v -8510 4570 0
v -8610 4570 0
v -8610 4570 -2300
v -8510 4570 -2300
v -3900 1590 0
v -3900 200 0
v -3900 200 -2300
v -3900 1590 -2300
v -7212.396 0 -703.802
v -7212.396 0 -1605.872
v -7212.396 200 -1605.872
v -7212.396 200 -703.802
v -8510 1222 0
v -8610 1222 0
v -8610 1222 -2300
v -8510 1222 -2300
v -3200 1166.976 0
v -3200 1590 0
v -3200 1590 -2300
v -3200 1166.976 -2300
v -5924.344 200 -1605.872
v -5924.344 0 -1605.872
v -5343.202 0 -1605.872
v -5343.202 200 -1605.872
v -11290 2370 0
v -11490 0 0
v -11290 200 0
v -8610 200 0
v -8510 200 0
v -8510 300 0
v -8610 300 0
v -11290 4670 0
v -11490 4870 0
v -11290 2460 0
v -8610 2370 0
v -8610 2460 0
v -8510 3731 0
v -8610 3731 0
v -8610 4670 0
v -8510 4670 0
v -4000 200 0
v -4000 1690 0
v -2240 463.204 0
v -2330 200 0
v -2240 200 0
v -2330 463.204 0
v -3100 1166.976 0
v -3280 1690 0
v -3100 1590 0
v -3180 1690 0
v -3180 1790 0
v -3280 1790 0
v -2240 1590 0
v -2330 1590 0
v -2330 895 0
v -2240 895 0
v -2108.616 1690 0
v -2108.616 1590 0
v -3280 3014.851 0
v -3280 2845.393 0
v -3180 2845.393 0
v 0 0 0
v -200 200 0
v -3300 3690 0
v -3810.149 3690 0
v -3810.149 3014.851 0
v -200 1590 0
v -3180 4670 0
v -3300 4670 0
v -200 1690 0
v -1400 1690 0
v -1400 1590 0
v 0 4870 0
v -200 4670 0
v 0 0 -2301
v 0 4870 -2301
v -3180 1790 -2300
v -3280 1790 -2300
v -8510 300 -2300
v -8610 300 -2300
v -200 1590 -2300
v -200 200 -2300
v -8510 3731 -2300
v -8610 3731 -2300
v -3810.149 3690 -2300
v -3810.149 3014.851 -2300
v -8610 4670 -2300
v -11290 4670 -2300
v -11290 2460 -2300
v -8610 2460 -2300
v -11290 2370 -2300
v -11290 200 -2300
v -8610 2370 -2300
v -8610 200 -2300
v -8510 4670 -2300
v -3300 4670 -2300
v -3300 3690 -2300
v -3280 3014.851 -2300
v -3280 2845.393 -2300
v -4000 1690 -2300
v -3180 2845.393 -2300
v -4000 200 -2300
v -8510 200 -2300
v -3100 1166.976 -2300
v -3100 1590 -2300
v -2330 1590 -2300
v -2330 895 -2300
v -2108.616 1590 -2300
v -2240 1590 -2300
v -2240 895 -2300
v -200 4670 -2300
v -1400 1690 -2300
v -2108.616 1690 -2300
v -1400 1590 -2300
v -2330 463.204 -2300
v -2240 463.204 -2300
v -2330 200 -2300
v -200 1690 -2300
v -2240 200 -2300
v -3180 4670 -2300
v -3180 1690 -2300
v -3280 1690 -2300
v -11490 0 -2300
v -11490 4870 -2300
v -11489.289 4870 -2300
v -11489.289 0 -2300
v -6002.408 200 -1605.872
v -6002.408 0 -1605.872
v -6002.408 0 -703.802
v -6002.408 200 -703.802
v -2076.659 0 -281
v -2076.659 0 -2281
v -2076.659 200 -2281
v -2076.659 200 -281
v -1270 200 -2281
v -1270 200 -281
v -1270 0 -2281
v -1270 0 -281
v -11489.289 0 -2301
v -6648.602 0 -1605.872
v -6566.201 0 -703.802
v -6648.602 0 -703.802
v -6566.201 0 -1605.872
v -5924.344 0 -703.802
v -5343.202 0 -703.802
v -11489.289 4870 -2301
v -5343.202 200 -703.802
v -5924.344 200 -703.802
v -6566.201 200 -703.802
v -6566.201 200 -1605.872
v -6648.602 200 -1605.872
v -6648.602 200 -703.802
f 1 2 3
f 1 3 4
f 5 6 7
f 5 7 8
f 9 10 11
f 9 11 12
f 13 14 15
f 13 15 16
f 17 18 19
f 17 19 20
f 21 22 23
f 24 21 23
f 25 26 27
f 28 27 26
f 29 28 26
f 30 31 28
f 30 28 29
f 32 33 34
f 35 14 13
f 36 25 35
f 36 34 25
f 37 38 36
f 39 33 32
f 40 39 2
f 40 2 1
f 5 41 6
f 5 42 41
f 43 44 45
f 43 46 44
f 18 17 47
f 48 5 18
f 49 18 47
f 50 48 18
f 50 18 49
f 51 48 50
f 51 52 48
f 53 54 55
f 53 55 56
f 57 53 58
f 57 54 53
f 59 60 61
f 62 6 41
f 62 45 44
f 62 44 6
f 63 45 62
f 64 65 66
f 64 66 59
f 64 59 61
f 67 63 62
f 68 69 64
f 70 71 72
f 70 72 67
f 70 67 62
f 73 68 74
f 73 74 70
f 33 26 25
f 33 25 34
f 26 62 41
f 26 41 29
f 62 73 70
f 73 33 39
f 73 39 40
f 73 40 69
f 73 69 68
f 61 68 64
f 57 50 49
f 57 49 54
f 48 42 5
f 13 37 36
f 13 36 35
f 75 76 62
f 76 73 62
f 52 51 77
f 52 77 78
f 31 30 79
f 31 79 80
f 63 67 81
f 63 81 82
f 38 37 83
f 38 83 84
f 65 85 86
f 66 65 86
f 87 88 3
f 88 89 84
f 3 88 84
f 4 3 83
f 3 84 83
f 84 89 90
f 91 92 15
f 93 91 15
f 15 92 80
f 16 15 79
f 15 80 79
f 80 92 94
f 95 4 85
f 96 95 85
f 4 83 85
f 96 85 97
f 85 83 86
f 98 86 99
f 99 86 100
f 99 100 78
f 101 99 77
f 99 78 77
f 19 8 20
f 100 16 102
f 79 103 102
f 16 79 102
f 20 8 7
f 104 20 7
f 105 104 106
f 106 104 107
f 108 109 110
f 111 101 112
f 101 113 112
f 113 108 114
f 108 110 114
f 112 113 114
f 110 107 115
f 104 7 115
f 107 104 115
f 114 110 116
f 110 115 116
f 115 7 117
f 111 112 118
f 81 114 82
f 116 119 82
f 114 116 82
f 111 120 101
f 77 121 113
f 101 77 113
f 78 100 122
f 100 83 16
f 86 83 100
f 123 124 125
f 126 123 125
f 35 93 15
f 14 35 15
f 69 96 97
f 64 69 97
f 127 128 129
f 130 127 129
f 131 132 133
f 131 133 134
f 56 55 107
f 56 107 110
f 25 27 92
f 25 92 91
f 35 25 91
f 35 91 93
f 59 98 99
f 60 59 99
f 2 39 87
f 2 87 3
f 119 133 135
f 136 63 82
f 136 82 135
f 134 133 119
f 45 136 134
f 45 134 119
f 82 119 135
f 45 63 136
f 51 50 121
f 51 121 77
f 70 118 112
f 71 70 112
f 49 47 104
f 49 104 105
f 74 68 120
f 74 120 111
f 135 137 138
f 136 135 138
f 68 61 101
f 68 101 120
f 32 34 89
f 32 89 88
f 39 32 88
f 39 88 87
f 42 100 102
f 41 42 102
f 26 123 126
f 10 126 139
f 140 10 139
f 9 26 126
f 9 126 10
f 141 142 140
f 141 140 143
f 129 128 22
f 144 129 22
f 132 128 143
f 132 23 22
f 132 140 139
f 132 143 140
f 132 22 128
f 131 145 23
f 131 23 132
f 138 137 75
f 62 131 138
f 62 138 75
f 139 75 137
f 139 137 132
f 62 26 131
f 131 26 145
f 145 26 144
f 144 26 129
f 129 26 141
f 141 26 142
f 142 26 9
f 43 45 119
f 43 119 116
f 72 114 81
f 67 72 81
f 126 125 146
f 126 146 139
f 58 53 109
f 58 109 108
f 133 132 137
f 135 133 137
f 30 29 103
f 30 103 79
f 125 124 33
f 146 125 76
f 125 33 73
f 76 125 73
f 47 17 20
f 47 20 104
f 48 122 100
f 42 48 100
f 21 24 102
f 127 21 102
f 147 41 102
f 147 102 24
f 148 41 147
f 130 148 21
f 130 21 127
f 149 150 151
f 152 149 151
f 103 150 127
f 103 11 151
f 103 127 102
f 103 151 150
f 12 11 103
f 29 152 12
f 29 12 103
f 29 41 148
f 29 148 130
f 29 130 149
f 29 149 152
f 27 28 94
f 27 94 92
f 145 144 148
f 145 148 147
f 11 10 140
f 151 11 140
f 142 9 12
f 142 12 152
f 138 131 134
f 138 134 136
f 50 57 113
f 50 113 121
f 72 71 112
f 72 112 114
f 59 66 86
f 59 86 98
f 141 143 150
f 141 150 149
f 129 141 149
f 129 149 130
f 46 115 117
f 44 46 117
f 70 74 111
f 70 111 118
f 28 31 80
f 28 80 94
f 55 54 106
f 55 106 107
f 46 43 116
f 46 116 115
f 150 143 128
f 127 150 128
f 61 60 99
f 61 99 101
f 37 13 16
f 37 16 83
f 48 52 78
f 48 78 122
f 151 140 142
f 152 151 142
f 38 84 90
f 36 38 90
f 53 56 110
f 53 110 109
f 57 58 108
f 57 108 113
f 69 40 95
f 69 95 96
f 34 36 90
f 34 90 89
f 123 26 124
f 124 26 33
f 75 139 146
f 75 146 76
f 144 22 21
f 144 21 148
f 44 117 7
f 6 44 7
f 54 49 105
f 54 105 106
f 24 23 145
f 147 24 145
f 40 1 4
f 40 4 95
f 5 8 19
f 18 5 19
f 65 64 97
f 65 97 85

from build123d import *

# Parameters (mm, degrees)
F0_W     = 11490
F0_H     = 4870
F1_DEPTH = 2300
F2_W     = 11489.289284
F2_H     = 4870
F3_DEPTH = 1
F4_W     = 806.658864
F4_H     = 2000
F4_W_2   = 563.794136
F4_H_2   = 902.069986
F4_W_3   = 563.793659
F4_W_4   = 581.141471
F5_DEPTH = 200


with BuildPart() as f1:
    # F0 (on Top) → F1 (new body)
    with BuildSketch(Plane.XY):
        with Locations((-5745, 2435)):
            Rectangle(F0_W, F0_H)
        Polygon((-11290, 2460), (-11290, 4670), (-8610, 4670), (-8610, 4570), (-8510, 4570), (-8510, 4670), (-3300, 4670), (-3300, 3690), (-3810.149231, 3690), (-3810.149231, 3014.851036), (-3280, 3014.851036), (-3280, 2845.392675), (-3180, 2845.392675), (-3180, 4670), (-200, 4670), (-200, 1690), (-1400, 1690), (-1400, 1590), (-200, 1590), (-200, 200), (-2240, 200), (-2240, 463.203937), (-2330, 463.203937), (-2330, 200), (-3900, 200), (-3900, 1590), (-3200, 1590), (-3200, 1166.976213), (-3100, 1166.976213), (-3100, 1590), (-2330, 1590), (-2330, 895), (-2240, 895), (-2240, 1590), (-2108.616352, 1590), (-2108.616352, 1690), (-2240, 1690), (-3180, 1690), (-3180, 1790), (-3280, 1790), (-3280, 1690), (-4000, 1690), (-4000, 200), (-8510, 200), (-8510, 300), (-8610, 300), (-8610, 200), (-11290, 200), (-11290, 2370), (-8610, 2370), (-8610, 1222), (-8510, 1222), (-8510, 3731), (-8610, 3731), (-8610, 2460), align=None, mode=Mode.SUBTRACT)
    extrude(amount=-F1_DEPTH)

    # F2 (on face) → F3 (join)
    with BuildSketch(Plane(origin=(0, 0, -2300), x_dir=(1, 0, 0), z_dir=(0, 0, -1))):
        with Locations((-5744.644642, -2435)):
            Rectangle(F2_W, F2_H)
    extrude(amount=F3_DEPTH)

    # F4 (on face) → F5 (cut, through all)
    with BuildSketch(Plane.XZ):
        with Locations((-1673.329432, -1281)):
            Rectangle(F4_W, F4_H)
        with Locations((-6930.4986, -1154.836923)):
            Rectangle(F4_W_2, F4_H_2)
        with Locations((-6284.30438, -1154.837042)):
            Rectangle(F4_W_3, F4_H_2)
        with Locations((-5633.773089, -1154.836893)):
            Rectangle(F4_W_4, F4_H_2)
    extrude(amount=-F5_DEPTH, mode=Mode.SUBTRACT)


solid = f1.part
